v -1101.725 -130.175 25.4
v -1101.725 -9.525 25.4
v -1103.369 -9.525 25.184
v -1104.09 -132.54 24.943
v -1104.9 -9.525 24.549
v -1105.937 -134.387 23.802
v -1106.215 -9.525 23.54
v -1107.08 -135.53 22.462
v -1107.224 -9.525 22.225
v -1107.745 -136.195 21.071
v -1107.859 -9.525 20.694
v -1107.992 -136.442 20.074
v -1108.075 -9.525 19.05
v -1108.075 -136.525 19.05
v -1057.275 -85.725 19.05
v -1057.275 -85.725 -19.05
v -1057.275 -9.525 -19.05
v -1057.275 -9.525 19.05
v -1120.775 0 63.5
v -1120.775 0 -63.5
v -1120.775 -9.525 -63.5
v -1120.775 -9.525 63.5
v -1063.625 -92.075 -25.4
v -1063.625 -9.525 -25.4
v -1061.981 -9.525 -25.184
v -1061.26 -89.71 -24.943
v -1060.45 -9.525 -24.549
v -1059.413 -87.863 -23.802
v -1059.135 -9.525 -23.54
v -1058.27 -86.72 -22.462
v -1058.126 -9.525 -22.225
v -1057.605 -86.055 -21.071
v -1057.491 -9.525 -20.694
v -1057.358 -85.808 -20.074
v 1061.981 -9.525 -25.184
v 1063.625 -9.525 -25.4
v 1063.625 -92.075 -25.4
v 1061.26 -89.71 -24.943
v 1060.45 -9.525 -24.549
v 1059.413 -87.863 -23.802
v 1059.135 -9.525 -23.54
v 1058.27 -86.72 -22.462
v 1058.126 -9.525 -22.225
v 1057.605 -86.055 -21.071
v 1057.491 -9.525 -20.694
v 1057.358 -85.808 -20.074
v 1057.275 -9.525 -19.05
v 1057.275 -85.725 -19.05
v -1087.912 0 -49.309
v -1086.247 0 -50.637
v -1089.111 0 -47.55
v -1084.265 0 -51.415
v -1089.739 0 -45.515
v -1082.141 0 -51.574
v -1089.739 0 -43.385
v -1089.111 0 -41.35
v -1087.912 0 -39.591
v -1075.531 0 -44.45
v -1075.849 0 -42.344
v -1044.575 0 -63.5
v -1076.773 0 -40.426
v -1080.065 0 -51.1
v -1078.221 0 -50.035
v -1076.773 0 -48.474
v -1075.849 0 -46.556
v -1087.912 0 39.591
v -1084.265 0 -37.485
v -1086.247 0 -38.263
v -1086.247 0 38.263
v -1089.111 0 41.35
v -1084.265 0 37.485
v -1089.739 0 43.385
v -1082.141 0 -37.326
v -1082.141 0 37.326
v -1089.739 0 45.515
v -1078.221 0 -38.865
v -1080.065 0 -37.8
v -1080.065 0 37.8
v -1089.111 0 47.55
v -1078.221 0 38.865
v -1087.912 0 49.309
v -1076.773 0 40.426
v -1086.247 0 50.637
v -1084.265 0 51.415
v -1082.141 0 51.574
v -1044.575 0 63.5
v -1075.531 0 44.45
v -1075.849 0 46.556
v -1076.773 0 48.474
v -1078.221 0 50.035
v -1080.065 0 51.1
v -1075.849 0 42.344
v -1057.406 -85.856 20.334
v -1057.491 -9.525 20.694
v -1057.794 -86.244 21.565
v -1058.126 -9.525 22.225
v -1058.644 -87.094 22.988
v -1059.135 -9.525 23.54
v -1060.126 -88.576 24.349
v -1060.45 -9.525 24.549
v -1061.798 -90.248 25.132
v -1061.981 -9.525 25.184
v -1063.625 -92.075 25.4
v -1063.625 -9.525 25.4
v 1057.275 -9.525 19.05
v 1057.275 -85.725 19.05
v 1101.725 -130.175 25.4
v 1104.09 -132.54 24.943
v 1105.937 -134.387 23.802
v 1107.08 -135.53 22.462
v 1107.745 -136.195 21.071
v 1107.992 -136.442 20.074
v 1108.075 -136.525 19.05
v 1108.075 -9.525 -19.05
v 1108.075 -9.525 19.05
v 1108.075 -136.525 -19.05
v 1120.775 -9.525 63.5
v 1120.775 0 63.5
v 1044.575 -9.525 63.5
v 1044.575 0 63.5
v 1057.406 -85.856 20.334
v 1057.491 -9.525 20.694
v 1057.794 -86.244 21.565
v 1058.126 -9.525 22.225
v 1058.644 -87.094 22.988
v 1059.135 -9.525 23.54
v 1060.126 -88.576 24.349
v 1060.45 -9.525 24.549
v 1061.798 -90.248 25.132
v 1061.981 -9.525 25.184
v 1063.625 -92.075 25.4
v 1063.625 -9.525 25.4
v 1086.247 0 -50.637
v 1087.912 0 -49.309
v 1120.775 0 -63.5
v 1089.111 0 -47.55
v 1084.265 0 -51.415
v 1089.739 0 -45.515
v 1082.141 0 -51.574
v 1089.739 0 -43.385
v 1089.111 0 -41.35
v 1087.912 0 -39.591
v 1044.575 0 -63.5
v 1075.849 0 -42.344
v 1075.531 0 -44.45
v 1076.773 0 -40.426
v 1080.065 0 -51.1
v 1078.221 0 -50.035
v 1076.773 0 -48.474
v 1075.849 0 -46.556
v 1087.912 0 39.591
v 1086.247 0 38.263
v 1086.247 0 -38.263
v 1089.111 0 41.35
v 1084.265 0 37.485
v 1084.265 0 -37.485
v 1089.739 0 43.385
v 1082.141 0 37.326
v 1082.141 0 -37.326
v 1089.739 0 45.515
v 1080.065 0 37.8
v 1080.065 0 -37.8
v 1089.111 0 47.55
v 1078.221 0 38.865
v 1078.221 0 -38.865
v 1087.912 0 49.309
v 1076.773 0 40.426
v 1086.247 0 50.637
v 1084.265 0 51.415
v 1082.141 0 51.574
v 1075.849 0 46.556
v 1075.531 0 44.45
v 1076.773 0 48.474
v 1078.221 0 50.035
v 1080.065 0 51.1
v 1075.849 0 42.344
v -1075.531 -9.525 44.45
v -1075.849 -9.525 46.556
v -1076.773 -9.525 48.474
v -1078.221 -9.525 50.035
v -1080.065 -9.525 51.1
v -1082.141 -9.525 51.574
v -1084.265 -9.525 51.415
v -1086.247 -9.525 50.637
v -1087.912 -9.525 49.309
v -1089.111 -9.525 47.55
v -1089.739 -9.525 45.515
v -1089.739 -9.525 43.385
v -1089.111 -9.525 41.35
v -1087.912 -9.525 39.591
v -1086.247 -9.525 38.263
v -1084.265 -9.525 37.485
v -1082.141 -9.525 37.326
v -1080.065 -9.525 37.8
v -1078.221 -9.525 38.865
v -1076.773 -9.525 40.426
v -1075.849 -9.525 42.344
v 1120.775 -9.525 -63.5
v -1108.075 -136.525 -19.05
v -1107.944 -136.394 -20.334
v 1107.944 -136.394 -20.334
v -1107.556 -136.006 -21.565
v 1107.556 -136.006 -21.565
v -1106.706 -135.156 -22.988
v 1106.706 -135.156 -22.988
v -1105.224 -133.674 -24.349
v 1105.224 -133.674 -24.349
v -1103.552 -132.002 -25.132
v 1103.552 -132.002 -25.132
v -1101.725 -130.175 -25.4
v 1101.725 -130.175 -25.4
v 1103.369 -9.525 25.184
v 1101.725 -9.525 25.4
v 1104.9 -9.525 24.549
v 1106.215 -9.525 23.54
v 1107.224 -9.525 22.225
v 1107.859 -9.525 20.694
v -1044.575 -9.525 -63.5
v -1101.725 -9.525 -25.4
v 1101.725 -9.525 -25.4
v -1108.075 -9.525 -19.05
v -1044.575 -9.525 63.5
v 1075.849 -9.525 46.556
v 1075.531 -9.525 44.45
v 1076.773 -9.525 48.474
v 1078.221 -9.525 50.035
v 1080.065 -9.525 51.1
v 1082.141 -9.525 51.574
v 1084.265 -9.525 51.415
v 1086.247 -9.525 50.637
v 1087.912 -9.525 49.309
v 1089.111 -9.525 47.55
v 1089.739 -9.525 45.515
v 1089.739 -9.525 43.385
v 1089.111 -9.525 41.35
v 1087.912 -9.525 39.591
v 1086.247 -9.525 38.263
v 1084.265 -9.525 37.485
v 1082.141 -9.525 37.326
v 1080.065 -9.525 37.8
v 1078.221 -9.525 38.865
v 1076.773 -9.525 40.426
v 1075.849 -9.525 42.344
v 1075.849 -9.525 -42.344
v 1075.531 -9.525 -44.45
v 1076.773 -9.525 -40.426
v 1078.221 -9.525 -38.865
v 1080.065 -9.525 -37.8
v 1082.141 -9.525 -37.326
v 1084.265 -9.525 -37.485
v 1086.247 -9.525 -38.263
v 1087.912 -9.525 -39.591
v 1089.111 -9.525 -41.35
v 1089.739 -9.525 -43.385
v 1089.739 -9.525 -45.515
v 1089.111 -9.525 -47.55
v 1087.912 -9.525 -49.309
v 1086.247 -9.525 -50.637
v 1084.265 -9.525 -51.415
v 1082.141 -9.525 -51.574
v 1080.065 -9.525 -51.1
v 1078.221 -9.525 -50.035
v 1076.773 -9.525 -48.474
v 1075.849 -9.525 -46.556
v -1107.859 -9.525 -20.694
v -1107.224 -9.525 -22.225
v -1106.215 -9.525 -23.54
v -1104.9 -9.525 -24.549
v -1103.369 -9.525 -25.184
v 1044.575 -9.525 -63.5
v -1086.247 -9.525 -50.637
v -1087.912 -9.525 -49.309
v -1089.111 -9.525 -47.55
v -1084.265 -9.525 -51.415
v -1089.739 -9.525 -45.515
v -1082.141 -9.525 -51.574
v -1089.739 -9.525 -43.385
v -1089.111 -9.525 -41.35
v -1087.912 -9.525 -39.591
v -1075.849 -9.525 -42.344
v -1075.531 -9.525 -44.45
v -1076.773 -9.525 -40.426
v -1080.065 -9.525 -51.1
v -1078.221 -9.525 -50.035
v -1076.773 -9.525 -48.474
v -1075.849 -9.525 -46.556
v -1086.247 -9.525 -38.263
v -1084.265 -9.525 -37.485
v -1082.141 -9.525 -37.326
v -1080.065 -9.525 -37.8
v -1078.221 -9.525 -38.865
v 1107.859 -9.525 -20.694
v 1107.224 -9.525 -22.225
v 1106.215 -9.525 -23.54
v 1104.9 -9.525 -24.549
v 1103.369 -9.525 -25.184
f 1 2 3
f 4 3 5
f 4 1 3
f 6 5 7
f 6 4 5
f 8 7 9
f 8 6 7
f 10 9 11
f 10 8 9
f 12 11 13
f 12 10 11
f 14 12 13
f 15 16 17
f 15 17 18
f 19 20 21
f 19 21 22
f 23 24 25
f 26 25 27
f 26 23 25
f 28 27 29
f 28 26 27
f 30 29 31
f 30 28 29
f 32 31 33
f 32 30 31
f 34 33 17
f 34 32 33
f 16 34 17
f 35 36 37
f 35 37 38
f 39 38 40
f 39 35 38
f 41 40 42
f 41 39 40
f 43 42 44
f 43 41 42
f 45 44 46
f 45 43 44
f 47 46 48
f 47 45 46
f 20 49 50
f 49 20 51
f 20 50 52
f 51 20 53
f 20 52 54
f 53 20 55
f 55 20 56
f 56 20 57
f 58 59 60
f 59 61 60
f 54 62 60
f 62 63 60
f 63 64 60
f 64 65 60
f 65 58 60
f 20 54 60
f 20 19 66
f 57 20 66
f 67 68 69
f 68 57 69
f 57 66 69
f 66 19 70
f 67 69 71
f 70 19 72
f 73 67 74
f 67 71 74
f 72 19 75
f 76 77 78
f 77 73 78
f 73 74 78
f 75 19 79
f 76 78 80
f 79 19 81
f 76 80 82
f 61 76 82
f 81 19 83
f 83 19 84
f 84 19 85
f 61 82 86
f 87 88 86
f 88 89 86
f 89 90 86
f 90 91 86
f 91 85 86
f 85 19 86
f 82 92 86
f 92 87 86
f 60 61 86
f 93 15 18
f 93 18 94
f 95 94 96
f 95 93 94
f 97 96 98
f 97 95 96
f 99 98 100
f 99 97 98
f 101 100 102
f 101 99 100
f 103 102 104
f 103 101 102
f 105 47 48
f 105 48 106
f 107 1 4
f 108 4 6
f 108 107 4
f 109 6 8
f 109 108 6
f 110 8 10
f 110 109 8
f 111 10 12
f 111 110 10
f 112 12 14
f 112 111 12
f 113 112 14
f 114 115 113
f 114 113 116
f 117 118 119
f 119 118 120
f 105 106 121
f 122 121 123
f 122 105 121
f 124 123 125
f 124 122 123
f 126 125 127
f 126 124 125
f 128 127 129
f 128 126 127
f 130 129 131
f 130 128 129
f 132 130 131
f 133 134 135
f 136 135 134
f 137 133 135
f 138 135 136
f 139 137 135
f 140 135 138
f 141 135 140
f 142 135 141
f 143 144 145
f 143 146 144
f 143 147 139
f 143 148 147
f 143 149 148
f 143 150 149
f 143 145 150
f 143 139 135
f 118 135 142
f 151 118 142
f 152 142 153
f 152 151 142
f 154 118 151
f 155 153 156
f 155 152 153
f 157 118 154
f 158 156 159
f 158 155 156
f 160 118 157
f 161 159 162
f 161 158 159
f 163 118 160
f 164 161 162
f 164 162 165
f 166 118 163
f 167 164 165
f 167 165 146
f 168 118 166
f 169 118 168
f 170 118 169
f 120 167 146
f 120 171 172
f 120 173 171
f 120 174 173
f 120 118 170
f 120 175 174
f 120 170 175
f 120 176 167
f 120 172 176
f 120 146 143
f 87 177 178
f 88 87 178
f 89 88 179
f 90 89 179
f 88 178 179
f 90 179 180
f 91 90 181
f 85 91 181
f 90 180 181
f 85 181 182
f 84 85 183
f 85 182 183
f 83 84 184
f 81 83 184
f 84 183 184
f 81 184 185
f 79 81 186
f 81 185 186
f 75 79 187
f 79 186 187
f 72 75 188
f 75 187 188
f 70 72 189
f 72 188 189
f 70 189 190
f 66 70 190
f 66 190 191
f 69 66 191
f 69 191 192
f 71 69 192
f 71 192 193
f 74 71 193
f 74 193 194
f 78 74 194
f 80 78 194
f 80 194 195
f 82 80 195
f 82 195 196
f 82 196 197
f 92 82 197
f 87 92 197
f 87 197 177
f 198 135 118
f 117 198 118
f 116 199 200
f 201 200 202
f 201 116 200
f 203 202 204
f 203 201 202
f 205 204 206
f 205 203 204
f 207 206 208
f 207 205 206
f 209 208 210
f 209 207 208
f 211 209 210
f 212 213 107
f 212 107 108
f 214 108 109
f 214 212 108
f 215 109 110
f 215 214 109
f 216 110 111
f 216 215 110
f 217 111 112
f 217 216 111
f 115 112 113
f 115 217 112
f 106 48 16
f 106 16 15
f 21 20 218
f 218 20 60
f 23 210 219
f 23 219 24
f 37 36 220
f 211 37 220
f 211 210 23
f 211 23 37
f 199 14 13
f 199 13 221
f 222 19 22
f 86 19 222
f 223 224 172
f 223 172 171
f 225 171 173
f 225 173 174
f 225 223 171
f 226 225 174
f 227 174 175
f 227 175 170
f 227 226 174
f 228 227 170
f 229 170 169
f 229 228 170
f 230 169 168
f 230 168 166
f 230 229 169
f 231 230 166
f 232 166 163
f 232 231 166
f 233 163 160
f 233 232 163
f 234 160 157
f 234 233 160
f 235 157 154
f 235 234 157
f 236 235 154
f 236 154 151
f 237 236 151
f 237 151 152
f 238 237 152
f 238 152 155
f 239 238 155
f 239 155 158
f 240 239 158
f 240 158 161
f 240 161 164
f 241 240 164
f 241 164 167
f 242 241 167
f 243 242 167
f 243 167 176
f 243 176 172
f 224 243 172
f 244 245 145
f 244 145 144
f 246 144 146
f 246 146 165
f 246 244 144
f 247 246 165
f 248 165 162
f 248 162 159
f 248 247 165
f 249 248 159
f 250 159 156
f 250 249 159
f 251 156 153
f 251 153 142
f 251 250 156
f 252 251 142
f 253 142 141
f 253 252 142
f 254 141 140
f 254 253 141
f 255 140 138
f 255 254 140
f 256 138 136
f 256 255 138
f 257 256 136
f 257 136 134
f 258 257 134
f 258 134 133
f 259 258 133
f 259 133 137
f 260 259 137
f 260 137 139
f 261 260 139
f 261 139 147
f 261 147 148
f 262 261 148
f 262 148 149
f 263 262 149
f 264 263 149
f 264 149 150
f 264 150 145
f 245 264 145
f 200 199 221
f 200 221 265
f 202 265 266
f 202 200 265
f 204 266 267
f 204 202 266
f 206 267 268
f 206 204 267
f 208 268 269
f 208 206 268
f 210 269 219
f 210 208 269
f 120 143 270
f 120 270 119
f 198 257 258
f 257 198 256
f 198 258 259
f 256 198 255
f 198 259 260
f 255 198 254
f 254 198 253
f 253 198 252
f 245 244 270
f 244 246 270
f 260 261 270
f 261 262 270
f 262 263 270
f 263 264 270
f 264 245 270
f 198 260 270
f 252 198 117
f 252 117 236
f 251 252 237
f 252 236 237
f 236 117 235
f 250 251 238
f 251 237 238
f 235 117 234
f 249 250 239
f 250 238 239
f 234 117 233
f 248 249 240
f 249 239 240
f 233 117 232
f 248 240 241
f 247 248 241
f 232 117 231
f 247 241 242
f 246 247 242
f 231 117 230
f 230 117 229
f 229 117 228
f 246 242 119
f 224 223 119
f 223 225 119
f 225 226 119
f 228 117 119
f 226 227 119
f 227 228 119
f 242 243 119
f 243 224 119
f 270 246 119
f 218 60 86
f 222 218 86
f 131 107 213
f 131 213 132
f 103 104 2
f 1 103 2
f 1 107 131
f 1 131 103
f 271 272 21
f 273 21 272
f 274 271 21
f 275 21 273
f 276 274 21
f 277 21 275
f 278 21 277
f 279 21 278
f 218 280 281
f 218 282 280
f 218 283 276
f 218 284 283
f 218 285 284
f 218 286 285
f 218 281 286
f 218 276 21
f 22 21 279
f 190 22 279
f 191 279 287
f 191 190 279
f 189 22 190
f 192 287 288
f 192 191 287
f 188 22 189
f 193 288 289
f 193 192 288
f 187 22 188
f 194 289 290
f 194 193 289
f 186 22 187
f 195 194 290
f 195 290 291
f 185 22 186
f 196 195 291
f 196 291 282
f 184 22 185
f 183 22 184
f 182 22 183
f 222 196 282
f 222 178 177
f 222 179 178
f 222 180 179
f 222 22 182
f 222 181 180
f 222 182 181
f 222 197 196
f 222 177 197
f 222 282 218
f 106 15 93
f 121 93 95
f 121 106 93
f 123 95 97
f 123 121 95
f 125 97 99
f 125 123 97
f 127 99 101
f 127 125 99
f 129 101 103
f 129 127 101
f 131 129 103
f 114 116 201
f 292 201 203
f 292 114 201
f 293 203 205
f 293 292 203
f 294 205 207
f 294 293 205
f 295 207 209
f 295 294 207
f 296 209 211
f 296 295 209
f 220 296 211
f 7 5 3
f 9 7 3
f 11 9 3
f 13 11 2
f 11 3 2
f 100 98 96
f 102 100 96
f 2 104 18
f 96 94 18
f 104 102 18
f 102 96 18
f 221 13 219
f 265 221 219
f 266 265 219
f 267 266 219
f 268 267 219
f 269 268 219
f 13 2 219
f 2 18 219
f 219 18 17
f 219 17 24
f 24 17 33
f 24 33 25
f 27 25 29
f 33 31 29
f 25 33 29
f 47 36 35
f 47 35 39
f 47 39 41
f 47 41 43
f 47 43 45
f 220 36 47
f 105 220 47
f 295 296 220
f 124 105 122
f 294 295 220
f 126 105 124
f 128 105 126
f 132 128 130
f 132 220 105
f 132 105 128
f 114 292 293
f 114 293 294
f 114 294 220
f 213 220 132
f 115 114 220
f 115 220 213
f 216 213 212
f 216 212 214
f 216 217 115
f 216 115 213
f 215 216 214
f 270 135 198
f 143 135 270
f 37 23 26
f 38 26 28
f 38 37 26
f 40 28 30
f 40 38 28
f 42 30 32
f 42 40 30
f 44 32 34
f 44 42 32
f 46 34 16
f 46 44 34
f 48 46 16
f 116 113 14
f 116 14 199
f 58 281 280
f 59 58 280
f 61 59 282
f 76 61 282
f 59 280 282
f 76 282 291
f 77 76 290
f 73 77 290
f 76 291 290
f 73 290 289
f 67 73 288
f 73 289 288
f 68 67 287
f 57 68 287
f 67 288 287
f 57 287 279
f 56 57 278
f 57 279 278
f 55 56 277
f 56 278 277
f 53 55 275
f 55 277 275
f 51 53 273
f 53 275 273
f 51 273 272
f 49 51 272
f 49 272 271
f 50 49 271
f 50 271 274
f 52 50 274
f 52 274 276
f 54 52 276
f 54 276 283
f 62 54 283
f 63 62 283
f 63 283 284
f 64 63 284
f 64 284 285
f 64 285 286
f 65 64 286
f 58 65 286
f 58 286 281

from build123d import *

# Parameters (mm, degrees)
F0_W     = 76.2
F0_H     = 127
F1_DEPTH = 9.525
F2_R     = 7.14375
F3_DEPTH = 25.4


with BuildPart() as f1:
    # F0 (on Front) → F1 (new body)
    with BuildSketch(Plane.XZ):
        with Locations((-1082.675, 0)):
            Rectangle(F0_W, F0_H)
        with BuildLine():
            ThreePointArc((-1108.075, 19.05), (-1106.2151280605, 23.5401280605), (-1101.725, 25.4))
            Line((-1101.725, 25.4), (-1063.625, 25.4))
            ThreePointArc((-1063.625, 25.4), (-1059.1348719395, 23.5401280605), (-1057.275, 19.05))
            Line((-1057.275, 19.05), (-1057.275, -19.05))
            ThreePointArc((-1057.275, -19.05), (-1059.1348719395, -23.5401280605), (-1063.625, -25.4))
            Line((-1063.625, -25.4), (-1101.725, -25.4))
            ThreePointArc((-1101.725, -25.4), (-1106.2151280605, -23.5401280605), (-1108.075, -19.05))
            Line((-1108.075, -19.05), (-1108.075, 19.05))
        make_face(mode=Mode.SUBTRACT)
        with BuildLine():
            Line((-1063.625, 25.4), (-1101.725, 25.4))
            ThreePointArc((-1101.725, 25.4), (-1106.2151280605, 23.5401280605), (-1108.075, 19.05))
            Line((-1108.075, 19.05), (-1108.075, -19.05))
            ThreePointArc((-1108.075, -19.05), (-1106.2151280605, -23.5401280605), (-1101.725, -25.4))
            Line((-1101.725, -25.4), (-1063.625, -25.4))
            ThreePointArc((-1063.625, -25.4), (-1059.1348719395, -23.5401280605), (-1057.275, -19.05))
            Line((-1057.275, -19.05), (-1057.275, 19.05))
            ThreePointArc((-1057.275, 19.05), (-1059.1348719395, 23.5401280605), (-1063.625, 25.4))
        make_face()
    extrude(amount=F1_DEPTH)

    # F2 (on face) → F3 (cut)
    with BuildSketch(Plane.XZ.offset(9.525)):
        with Locations((-1082.675, 44.45)):
            Circle(F2_R)
        with Locations((-1082.675, -44.45)):
            Circle(F2_R)
    extrude(amount=-F3_DEPTH, mode=Mode.SUBTRACT)


with BuildPart() as f4_1:
    # F4: instance of F1
    add(f1.part.mirror(Plane.YZ))


with BuildPart() as f7:
    # F7: sweep along a path in F6
    with BuildLine(Plane.XY) as f7_path:
        Line((-1082.675, -9.525), (-1082.675, -111.125))
        Line((-1082.675, -111.125), (1082.675, -111.125))
        Line((1082.675, -111.125), (1082.675, -9.525))
    # F5 (on face) → F7 (sweep)
    with BuildSketch(Plane.XZ.offset(9.525)):
        with BuildLine():
            Line((-1063.625, 25.4), (-1101.725, 25.4))
            ThreePointArc((-1101.725, 25.4), (-1106.2151280605, 23.5401280605), (-1108.075, 19.05))
            Line((-1108.075, 19.05), (-1108.075, -19.05))
            ThreePointArc((-1108.075, -19.05), (-1106.2151280605, -23.5401280605), (-1101.725, -25.4))
            Line((-1101.725, -25.4), (-1063.625, -25.4))
            ThreePointArc((-1063.625, -25.4), (-1059.1348719395, -23.5401280605), (-1057.275, -19.05))
            Line((-1057.275, -19.05), (-1057.275, 19.05))
            ThreePointArc((-1057.275, 19.05), (-1059.1348719395, 23.5401280605), (-1063.625, 25.4))
        make_face()
    sweep(path=f7_path.line, transition=Transition.RIGHT)


solid = Compound([f1.part, f4_1.part, f7.part])
